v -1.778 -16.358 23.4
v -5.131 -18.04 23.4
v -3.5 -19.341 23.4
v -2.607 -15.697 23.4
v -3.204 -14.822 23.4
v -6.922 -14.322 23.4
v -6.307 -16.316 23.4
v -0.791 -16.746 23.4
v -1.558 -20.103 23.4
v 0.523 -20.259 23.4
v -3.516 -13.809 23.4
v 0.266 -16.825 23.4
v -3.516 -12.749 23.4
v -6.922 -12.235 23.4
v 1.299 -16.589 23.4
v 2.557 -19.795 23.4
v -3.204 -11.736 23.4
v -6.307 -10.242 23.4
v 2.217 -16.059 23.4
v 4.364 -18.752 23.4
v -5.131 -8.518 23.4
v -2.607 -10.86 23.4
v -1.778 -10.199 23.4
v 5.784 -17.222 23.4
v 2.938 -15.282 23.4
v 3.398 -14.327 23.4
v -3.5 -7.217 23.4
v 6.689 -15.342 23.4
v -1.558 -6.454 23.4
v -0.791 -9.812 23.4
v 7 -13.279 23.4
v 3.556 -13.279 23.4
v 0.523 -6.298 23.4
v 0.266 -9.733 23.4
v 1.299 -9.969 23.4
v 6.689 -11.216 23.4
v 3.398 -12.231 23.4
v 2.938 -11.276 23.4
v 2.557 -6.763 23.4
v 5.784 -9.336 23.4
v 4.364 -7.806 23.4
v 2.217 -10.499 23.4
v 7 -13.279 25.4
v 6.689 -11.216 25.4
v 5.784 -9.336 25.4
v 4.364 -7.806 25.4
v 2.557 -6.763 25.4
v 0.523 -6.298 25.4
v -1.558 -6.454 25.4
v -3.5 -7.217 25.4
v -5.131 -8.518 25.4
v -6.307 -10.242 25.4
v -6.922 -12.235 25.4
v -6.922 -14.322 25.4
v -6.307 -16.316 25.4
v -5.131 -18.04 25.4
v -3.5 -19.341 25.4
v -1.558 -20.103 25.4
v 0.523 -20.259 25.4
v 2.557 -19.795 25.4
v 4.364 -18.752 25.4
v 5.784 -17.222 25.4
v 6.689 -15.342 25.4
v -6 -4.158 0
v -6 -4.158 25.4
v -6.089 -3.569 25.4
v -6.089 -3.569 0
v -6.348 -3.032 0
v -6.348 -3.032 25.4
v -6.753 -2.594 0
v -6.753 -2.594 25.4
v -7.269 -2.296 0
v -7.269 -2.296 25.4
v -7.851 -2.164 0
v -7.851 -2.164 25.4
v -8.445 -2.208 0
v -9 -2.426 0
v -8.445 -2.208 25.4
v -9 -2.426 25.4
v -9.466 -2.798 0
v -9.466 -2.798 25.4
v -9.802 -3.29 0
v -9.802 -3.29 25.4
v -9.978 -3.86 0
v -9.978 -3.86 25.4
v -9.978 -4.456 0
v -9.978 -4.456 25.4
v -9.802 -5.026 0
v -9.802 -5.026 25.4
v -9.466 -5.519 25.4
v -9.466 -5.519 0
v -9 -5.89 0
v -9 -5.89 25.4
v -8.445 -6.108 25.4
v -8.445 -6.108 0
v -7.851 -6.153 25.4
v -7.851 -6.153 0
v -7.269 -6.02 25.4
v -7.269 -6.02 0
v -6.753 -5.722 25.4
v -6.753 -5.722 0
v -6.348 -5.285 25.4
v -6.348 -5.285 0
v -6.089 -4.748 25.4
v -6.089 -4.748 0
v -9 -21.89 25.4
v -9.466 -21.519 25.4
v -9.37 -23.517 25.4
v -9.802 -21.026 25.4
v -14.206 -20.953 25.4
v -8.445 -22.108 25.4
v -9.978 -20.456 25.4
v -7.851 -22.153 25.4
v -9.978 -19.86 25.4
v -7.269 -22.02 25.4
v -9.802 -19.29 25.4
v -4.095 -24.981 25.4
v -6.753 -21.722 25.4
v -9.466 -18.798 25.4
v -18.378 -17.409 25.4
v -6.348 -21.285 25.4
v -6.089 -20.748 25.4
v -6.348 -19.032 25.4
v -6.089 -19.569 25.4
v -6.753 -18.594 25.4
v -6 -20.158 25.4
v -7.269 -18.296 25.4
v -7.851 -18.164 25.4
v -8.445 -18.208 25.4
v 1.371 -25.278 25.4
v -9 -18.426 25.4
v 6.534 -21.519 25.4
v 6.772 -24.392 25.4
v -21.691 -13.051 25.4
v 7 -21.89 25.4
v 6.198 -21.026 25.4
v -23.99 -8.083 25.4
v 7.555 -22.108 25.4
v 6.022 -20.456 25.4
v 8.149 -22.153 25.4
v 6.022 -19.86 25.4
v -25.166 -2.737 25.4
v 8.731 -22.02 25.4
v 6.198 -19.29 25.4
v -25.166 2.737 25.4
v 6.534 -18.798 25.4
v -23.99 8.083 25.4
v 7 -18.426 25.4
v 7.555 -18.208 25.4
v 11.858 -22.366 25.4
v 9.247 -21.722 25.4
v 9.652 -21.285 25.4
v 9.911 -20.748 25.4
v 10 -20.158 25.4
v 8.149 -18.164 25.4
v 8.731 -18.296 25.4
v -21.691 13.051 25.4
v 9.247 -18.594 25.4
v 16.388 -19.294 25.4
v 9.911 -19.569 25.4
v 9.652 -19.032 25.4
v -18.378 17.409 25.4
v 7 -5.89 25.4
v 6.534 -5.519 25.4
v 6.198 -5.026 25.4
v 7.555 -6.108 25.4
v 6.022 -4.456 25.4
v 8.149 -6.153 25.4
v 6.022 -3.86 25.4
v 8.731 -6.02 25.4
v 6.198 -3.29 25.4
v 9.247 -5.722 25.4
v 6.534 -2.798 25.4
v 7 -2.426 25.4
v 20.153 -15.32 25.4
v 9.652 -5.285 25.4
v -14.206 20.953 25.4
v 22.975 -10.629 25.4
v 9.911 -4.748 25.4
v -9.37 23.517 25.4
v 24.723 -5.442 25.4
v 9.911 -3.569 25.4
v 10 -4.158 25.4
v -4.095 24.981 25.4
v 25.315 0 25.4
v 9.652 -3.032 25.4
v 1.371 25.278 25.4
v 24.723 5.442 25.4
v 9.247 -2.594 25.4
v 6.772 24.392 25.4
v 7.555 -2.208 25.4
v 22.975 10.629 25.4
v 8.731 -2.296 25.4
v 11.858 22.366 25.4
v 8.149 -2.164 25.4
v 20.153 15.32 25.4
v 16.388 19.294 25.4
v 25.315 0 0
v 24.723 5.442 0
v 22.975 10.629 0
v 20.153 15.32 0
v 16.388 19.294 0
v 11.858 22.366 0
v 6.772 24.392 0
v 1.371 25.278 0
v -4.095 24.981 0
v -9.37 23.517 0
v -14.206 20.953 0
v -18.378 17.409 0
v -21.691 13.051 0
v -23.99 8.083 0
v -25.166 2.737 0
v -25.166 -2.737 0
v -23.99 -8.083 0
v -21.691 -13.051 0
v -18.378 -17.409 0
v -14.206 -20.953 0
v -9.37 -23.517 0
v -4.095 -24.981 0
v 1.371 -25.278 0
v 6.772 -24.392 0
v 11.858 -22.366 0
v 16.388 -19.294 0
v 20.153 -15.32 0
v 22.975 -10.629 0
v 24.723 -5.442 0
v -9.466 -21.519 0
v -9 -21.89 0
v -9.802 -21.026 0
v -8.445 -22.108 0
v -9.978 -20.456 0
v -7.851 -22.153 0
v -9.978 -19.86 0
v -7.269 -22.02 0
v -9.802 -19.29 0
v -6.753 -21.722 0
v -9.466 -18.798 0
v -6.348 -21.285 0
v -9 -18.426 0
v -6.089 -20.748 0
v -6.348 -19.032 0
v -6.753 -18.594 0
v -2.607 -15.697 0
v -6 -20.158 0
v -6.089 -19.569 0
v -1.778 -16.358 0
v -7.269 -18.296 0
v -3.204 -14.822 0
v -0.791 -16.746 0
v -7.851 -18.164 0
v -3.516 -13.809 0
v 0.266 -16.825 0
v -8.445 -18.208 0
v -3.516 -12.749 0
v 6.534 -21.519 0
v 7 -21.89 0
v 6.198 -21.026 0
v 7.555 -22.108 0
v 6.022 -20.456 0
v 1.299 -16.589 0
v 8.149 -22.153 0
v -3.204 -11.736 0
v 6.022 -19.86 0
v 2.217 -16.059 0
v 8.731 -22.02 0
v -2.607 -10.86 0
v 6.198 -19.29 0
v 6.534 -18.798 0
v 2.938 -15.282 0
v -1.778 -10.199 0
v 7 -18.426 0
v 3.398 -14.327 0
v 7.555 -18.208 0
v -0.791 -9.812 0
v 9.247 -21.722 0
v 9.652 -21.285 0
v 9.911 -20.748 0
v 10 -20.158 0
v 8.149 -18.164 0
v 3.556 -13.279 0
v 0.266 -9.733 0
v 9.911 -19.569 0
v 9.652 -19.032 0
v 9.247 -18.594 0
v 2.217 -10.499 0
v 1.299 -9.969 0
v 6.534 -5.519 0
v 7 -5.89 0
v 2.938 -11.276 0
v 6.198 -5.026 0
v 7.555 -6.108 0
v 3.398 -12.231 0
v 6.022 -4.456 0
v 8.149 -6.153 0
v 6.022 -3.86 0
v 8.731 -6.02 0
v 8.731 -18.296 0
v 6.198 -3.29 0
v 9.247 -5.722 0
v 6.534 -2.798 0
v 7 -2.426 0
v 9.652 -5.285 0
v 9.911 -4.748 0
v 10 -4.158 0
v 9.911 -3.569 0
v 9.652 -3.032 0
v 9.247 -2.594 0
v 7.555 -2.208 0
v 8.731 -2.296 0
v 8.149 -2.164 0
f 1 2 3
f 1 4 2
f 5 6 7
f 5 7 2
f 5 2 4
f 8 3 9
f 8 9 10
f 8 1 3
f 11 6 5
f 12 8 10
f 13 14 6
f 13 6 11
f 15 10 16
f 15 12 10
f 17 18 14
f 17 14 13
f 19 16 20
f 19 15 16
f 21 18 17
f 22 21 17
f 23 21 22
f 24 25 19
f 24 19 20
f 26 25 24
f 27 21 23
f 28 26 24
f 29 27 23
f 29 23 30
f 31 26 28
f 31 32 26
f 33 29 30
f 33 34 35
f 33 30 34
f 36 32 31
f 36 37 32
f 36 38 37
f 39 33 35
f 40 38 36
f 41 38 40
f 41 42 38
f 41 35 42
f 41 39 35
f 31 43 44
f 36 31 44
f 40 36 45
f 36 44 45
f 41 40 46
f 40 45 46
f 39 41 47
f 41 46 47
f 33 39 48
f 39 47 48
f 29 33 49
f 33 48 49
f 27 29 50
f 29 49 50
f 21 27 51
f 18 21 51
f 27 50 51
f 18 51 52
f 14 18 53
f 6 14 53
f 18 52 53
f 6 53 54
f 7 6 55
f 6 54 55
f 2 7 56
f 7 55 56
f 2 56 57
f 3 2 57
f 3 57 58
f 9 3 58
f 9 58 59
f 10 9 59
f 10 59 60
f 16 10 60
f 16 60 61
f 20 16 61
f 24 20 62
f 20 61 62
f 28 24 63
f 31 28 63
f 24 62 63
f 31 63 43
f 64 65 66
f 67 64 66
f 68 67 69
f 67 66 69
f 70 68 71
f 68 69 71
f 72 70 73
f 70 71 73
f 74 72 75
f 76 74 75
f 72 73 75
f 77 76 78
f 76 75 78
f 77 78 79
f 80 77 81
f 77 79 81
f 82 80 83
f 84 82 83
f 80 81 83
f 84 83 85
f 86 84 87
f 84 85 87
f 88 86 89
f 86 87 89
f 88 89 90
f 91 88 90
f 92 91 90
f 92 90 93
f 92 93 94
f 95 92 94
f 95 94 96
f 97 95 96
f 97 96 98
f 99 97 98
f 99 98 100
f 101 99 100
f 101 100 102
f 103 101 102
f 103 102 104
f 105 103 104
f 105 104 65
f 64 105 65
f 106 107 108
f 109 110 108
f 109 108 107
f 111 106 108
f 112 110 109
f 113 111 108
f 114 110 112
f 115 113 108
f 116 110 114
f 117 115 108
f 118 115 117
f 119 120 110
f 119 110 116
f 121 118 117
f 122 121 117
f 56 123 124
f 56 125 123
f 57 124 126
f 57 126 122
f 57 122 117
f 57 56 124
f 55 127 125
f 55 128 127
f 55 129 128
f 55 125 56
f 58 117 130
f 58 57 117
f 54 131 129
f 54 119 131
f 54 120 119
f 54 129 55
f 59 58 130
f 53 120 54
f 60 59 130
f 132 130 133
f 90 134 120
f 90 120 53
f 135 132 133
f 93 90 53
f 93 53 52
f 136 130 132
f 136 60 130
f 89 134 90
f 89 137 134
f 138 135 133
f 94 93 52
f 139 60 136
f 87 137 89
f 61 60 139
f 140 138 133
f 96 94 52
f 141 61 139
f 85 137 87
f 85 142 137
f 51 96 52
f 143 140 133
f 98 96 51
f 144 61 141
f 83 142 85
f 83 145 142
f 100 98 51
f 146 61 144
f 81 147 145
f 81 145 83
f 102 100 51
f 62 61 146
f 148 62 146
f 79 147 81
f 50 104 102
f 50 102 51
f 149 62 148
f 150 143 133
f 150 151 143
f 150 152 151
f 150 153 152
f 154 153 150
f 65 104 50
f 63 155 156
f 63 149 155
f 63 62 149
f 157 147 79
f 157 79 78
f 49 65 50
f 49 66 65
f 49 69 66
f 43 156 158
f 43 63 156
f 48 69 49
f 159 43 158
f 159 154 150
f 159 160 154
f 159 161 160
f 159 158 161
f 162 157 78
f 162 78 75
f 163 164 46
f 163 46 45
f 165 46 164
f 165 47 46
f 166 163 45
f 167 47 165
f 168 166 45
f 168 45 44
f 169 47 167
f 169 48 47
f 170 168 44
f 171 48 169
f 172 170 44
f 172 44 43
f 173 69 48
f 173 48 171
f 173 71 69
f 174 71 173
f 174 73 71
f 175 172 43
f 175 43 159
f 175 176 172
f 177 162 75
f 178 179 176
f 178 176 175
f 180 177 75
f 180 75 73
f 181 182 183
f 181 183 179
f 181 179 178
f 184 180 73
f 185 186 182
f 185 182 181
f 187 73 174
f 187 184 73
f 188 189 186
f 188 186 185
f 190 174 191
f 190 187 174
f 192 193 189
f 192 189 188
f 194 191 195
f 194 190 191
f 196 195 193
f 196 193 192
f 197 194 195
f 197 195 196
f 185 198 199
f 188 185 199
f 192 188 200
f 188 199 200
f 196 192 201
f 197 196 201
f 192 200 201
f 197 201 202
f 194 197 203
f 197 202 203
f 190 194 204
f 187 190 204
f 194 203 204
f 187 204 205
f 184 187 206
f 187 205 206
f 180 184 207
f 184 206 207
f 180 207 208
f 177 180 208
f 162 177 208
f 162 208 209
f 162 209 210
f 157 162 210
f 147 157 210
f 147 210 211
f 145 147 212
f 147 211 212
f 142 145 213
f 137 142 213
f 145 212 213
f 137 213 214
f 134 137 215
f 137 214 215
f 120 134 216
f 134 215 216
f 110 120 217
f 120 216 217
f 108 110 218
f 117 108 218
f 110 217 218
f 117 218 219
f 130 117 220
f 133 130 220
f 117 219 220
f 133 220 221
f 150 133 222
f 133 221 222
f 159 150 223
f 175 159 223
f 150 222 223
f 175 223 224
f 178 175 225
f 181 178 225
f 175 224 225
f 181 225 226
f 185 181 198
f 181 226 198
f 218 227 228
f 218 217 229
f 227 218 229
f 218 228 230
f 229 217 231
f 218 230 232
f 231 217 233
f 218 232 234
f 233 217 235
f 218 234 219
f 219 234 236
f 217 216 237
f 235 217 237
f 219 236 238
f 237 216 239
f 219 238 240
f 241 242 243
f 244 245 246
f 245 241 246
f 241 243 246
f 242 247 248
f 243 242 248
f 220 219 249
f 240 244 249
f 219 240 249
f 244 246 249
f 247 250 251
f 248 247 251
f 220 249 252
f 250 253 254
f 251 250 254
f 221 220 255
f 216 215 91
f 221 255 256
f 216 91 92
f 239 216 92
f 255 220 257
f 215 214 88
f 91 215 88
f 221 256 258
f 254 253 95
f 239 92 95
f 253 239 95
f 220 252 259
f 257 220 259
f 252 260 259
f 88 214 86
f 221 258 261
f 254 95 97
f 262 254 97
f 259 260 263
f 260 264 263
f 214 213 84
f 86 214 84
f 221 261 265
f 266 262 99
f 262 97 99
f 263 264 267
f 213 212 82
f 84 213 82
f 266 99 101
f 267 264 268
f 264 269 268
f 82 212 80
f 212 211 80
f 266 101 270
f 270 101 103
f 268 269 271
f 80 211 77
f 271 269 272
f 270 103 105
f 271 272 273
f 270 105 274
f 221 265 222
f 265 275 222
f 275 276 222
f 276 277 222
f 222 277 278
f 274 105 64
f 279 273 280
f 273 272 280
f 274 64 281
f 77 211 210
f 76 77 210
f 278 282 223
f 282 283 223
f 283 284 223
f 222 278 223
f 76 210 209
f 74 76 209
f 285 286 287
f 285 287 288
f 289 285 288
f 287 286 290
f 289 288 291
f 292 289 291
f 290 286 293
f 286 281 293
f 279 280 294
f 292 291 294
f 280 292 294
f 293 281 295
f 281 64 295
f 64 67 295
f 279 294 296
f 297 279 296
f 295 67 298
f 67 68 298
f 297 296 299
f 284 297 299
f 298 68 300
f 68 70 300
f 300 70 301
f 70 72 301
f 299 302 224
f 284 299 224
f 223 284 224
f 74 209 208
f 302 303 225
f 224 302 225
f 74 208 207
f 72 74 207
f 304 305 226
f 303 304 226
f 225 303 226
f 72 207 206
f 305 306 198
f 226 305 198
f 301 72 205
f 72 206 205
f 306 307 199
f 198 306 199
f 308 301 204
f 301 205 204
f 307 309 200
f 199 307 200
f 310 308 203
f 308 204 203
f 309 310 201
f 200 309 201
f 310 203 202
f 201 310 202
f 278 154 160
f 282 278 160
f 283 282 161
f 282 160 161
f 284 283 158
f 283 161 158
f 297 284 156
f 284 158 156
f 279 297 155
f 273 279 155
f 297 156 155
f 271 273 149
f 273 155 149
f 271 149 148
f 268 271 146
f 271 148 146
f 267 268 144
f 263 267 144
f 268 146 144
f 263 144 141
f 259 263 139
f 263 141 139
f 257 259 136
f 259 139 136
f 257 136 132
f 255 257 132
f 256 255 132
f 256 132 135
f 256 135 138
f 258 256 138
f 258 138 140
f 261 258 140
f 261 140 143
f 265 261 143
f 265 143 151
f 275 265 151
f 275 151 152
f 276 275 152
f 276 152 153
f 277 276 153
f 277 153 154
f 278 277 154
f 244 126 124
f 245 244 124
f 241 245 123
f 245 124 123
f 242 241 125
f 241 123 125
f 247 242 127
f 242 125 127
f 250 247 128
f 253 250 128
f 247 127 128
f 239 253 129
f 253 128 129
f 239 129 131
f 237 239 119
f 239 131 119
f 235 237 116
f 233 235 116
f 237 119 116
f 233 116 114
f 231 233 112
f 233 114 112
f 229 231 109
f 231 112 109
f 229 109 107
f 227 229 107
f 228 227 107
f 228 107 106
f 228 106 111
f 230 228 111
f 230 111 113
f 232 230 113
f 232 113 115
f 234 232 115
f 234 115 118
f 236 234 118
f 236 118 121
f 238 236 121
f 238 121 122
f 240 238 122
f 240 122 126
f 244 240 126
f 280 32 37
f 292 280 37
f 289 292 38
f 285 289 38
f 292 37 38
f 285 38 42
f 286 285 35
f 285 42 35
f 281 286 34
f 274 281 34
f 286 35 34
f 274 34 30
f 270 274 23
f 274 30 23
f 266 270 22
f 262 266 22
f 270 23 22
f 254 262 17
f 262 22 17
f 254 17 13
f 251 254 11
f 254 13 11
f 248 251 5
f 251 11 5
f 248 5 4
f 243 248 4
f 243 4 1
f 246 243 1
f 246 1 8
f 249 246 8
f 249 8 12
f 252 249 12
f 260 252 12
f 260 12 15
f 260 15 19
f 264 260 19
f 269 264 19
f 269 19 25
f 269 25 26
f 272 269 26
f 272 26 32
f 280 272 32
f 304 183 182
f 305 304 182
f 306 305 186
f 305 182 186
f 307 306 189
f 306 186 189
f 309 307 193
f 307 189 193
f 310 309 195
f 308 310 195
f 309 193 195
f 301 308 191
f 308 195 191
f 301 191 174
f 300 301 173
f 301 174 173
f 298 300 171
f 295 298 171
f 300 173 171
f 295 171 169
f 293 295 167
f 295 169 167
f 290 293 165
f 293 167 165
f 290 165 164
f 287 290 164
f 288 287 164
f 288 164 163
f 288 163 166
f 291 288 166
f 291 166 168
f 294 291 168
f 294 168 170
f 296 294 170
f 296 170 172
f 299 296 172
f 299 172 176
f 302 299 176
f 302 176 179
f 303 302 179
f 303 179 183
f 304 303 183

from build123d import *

# Parameters (mm, degrees)
SKETCH1_R           = 25.314646171
BOSS_EXTRUDE1_DEPTH = 25.4
SKETCH2_R           = 3.556
CUT_EXTRUDE1_DEPTH  = 25.4
SKETCH3_R           = 7
SKETCH3_R_2         = 3.556
CUT_EXTRUDE2_DEPTH  = 2
SKETCH4_R           = 2
CUT_EXTRUDE3_DEPTH  = 26.4


with BuildPart() as part:
    # Sketch1 → Boss-Extrude1 (new body)
    with BuildSketch(Plane.XY):
        Circle(SKETCH1_R)
    extrude(amount=BOSS_EXTRUDE1_DEPTH)

    # Sketch2 → Cut-Extrude1 (cut)
    with BuildSketch(Plane.XY.offset(25.4)):
        with Locations((0, -13.278788033)):
            Circle(SKETCH2_R)
    extrude(amount=-CUT_EXTRUDE1_DEPTH, mode=Mode.SUBTRACT)

    # Sketch3 → Cut-Extrude2 (cut)
    with BuildSketch(Plane.XY.offset(25.4)):
        with Locations((0, -13.278788033)):
            Circle(SKETCH3_R)
        with Locations((0, -13.278788033)):
            Circle(SKETCH3_R_2, mode=Mode.SUBTRACT)
    extrude(amount=-CUT_EXTRUDE2_DEPTH, mode=Mode.SUBTRACT)

    # Sketch4 → Cut-Extrude3 (cut, through all)
    with BuildSketch(Plane.XY.offset(25.4)):
        with Locations((-8, -4.158160147)):
            Circle(SKETCH4_R)
        with Locations((8, -4.158160147)):
            Circle(SKETCH4_R)
        with Locations((8, -20.158160147)):
            Circle(SKETCH4_R)
        with Locations((-8, -20.158160147)):
            Circle(SKETCH4_R)
    extrude(amount=-CUT_EXTRUDE3_DEPTH, mode=Mode.SUBTRACT)


solid = part.part
